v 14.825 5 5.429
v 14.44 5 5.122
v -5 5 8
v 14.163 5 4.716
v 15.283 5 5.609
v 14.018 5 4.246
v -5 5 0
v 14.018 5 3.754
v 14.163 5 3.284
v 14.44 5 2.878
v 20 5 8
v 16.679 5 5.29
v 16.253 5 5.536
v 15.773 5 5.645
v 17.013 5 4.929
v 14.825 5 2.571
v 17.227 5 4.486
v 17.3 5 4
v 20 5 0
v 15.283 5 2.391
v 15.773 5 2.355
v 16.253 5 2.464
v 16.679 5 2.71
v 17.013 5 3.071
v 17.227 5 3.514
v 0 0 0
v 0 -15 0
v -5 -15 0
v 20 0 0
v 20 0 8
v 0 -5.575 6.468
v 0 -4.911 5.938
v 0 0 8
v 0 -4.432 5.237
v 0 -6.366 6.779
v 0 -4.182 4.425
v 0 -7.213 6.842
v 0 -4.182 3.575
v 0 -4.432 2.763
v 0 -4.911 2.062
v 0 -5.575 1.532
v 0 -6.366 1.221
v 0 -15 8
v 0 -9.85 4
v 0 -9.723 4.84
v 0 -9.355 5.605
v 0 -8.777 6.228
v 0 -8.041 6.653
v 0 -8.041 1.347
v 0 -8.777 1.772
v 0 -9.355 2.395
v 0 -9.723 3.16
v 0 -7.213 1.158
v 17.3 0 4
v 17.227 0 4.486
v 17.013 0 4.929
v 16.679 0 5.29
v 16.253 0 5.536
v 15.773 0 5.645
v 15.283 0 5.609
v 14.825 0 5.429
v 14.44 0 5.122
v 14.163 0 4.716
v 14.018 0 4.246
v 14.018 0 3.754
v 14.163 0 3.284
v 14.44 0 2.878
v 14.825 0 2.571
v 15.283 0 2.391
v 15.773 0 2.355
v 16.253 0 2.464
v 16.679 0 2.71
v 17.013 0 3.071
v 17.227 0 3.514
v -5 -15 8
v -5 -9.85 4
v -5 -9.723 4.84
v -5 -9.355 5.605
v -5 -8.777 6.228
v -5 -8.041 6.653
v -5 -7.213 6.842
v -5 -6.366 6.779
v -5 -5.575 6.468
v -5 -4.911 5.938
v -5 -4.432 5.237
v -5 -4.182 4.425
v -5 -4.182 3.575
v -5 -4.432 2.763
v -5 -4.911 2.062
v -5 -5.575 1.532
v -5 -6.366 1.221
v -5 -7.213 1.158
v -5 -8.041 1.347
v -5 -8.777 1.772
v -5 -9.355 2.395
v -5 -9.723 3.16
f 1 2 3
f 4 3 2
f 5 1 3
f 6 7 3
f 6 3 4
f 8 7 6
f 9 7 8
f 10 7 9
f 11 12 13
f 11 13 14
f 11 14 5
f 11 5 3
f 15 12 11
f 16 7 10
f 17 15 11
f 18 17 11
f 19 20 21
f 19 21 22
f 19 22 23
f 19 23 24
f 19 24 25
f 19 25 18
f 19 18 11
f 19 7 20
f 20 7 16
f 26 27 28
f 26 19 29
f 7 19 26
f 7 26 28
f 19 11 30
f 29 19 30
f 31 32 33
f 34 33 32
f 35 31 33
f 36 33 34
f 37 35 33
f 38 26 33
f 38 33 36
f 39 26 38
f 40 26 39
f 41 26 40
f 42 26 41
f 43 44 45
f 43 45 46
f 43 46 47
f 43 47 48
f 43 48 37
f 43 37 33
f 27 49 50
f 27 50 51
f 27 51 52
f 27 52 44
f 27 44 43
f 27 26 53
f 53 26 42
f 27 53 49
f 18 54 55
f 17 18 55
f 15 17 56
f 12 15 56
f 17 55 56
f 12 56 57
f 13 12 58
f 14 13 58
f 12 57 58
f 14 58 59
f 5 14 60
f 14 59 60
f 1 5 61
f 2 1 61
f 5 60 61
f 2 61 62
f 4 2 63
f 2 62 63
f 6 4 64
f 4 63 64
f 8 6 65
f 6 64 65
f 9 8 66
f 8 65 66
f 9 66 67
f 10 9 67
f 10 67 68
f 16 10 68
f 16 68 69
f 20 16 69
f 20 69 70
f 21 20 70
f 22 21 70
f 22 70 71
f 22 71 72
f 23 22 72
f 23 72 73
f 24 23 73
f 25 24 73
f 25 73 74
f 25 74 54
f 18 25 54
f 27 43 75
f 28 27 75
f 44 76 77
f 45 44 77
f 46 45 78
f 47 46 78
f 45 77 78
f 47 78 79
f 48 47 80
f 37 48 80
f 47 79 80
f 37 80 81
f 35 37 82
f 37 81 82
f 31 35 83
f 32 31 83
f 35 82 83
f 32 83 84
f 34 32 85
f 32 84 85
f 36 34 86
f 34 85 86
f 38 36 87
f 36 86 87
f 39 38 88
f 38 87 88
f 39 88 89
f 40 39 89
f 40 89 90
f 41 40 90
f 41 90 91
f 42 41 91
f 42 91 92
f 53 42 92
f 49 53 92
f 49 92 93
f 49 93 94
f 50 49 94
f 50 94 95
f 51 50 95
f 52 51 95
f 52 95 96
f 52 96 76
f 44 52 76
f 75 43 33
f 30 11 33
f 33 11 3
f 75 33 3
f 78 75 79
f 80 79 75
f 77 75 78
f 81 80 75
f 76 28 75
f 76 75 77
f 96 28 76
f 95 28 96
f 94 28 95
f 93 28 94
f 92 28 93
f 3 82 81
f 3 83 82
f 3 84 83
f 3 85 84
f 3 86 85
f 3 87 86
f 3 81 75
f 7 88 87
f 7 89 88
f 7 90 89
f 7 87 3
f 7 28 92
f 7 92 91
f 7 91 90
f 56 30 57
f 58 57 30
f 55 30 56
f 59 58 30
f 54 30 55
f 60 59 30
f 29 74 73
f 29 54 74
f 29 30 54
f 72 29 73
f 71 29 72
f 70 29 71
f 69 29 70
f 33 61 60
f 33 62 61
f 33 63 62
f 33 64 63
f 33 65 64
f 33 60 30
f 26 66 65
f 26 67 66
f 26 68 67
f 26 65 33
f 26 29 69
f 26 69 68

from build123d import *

# Parameters (mm, degrees)
EXTRUDE_1_DEPTH     = 8
SKETCH_2_R          = 1.65
CUT_EXTRUDE_1_DEPTH = 8
SKETCH_3_R          = 2.85
CUT_EXTRUDE_2_DEPTH = 8


with BuildPart() as part:
    # 草图1 → 凸台-拉伸1 (new body)
    with BuildSketch(Plane.XY):
        Polygon((0, 0), (0, -15), (-5, -15), (-5, 5), (20, 5), (20, 0), align=None)
    extrude(amount=EXTRUDE_1_DEPTH)

    # 草图2 → 切除-拉伸1 (cut)
    with BuildSketch(Plane.XZ):
        with Locations((15.65, 4)):
            Circle(SKETCH_2_R)
    extrude(amount=-CUT_EXTRUDE_1_DEPTH, mode=Mode.SUBTRACT)

    # 草图3 → 切除-拉伸2 (cut)
    with BuildSketch(Plane.ZY.offset(5)):
        with Locations(Location((4, -7, 0), (0, 0, 270))):
            Circle(SKETCH_3_R)
    extrude(amount=-CUT_EXTRUDE_2_DEPTH, mode=Mode.SUBTRACT)


solid = part.part
